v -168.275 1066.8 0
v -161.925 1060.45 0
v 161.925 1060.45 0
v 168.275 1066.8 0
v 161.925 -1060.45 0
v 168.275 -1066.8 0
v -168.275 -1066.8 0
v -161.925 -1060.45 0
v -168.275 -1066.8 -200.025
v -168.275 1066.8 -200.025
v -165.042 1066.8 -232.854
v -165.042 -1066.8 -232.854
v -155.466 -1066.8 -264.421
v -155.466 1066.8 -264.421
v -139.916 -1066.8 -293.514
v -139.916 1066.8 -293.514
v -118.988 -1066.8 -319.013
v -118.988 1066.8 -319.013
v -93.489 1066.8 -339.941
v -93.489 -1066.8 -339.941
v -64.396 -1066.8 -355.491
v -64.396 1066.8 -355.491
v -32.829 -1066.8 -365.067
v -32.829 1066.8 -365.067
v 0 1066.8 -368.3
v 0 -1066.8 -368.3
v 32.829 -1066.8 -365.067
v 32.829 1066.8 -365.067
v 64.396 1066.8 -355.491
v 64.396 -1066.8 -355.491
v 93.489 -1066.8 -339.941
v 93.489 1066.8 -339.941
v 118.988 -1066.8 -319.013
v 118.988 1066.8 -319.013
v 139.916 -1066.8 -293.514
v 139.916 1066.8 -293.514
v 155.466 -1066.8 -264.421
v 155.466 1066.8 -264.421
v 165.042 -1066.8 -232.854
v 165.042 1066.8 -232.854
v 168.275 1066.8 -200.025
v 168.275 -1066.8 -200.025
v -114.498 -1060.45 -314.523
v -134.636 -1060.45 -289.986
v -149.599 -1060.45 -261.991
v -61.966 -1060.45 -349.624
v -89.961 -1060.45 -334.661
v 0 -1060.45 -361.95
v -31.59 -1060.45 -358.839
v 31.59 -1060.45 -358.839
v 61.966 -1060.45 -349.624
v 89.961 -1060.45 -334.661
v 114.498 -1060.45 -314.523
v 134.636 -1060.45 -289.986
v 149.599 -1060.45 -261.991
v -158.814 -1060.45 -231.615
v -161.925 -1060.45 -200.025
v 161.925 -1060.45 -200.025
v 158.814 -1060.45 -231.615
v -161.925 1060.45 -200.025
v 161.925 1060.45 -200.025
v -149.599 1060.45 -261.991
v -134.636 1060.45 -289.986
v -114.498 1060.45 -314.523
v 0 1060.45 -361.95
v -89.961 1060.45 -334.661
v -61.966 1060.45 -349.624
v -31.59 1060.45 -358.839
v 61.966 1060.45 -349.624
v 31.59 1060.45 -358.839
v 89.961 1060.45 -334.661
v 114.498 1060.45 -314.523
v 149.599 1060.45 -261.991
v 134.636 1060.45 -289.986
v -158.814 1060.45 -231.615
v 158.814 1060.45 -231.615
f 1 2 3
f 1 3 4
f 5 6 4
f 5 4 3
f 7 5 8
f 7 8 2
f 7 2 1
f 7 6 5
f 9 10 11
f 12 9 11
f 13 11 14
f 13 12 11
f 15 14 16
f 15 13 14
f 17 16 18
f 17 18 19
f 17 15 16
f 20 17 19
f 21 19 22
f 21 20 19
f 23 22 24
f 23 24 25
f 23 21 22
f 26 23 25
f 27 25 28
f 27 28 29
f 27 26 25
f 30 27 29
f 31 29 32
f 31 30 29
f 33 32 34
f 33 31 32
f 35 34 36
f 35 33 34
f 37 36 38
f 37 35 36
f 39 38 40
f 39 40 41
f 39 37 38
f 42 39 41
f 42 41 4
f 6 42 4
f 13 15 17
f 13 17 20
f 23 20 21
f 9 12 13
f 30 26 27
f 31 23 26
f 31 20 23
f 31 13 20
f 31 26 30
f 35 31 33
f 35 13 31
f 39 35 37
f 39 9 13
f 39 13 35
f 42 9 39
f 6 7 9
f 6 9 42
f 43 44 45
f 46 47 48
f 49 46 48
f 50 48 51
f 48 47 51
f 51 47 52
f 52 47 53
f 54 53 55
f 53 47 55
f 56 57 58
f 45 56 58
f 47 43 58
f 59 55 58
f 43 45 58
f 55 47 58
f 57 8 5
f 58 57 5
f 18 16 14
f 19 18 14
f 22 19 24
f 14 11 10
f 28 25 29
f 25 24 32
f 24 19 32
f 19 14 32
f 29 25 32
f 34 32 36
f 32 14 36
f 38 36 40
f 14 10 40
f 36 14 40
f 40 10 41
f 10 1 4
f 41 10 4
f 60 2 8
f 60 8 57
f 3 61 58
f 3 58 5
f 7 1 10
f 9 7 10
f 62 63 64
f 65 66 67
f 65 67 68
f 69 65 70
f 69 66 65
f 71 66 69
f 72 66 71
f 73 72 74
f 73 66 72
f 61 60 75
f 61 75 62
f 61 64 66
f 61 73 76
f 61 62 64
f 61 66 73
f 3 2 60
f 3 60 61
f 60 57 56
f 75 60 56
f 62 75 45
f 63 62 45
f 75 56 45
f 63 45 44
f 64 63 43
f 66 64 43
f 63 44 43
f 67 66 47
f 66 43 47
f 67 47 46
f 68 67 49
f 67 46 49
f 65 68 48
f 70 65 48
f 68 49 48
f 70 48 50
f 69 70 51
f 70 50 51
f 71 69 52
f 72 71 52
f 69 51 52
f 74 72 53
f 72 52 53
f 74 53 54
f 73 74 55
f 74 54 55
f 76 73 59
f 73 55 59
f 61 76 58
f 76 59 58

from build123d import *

# Parameters (mm, degrees)
F1_DEPTH = 1066.8
F2_T     = -6.35


with BuildPart() as f1:
    # F0 (on Front) → F1 (new body, symmetric)
    with BuildSketch(Plane.XZ):
        with BuildLine():
            Line((168.275, 0), (-168.275, 0))
            Line((-168.275, 0), (-168.275, -200.025))
            ThreePointArc((-168.275, -200.025), (0, -368.3), (168.275, -200.025))
            Line((168.275, -200.025), (168.275, 0))
        make_face()
    extrude(amount=F1_DEPTH, both=True)

    # F2
    f2_openings = [f1.faces().sort_by_distance(p)[0] for p in [
        (0, 0, 0),
    ]]
    offset(amount=F2_T, openings=f2_openings)


solid = f1.part
